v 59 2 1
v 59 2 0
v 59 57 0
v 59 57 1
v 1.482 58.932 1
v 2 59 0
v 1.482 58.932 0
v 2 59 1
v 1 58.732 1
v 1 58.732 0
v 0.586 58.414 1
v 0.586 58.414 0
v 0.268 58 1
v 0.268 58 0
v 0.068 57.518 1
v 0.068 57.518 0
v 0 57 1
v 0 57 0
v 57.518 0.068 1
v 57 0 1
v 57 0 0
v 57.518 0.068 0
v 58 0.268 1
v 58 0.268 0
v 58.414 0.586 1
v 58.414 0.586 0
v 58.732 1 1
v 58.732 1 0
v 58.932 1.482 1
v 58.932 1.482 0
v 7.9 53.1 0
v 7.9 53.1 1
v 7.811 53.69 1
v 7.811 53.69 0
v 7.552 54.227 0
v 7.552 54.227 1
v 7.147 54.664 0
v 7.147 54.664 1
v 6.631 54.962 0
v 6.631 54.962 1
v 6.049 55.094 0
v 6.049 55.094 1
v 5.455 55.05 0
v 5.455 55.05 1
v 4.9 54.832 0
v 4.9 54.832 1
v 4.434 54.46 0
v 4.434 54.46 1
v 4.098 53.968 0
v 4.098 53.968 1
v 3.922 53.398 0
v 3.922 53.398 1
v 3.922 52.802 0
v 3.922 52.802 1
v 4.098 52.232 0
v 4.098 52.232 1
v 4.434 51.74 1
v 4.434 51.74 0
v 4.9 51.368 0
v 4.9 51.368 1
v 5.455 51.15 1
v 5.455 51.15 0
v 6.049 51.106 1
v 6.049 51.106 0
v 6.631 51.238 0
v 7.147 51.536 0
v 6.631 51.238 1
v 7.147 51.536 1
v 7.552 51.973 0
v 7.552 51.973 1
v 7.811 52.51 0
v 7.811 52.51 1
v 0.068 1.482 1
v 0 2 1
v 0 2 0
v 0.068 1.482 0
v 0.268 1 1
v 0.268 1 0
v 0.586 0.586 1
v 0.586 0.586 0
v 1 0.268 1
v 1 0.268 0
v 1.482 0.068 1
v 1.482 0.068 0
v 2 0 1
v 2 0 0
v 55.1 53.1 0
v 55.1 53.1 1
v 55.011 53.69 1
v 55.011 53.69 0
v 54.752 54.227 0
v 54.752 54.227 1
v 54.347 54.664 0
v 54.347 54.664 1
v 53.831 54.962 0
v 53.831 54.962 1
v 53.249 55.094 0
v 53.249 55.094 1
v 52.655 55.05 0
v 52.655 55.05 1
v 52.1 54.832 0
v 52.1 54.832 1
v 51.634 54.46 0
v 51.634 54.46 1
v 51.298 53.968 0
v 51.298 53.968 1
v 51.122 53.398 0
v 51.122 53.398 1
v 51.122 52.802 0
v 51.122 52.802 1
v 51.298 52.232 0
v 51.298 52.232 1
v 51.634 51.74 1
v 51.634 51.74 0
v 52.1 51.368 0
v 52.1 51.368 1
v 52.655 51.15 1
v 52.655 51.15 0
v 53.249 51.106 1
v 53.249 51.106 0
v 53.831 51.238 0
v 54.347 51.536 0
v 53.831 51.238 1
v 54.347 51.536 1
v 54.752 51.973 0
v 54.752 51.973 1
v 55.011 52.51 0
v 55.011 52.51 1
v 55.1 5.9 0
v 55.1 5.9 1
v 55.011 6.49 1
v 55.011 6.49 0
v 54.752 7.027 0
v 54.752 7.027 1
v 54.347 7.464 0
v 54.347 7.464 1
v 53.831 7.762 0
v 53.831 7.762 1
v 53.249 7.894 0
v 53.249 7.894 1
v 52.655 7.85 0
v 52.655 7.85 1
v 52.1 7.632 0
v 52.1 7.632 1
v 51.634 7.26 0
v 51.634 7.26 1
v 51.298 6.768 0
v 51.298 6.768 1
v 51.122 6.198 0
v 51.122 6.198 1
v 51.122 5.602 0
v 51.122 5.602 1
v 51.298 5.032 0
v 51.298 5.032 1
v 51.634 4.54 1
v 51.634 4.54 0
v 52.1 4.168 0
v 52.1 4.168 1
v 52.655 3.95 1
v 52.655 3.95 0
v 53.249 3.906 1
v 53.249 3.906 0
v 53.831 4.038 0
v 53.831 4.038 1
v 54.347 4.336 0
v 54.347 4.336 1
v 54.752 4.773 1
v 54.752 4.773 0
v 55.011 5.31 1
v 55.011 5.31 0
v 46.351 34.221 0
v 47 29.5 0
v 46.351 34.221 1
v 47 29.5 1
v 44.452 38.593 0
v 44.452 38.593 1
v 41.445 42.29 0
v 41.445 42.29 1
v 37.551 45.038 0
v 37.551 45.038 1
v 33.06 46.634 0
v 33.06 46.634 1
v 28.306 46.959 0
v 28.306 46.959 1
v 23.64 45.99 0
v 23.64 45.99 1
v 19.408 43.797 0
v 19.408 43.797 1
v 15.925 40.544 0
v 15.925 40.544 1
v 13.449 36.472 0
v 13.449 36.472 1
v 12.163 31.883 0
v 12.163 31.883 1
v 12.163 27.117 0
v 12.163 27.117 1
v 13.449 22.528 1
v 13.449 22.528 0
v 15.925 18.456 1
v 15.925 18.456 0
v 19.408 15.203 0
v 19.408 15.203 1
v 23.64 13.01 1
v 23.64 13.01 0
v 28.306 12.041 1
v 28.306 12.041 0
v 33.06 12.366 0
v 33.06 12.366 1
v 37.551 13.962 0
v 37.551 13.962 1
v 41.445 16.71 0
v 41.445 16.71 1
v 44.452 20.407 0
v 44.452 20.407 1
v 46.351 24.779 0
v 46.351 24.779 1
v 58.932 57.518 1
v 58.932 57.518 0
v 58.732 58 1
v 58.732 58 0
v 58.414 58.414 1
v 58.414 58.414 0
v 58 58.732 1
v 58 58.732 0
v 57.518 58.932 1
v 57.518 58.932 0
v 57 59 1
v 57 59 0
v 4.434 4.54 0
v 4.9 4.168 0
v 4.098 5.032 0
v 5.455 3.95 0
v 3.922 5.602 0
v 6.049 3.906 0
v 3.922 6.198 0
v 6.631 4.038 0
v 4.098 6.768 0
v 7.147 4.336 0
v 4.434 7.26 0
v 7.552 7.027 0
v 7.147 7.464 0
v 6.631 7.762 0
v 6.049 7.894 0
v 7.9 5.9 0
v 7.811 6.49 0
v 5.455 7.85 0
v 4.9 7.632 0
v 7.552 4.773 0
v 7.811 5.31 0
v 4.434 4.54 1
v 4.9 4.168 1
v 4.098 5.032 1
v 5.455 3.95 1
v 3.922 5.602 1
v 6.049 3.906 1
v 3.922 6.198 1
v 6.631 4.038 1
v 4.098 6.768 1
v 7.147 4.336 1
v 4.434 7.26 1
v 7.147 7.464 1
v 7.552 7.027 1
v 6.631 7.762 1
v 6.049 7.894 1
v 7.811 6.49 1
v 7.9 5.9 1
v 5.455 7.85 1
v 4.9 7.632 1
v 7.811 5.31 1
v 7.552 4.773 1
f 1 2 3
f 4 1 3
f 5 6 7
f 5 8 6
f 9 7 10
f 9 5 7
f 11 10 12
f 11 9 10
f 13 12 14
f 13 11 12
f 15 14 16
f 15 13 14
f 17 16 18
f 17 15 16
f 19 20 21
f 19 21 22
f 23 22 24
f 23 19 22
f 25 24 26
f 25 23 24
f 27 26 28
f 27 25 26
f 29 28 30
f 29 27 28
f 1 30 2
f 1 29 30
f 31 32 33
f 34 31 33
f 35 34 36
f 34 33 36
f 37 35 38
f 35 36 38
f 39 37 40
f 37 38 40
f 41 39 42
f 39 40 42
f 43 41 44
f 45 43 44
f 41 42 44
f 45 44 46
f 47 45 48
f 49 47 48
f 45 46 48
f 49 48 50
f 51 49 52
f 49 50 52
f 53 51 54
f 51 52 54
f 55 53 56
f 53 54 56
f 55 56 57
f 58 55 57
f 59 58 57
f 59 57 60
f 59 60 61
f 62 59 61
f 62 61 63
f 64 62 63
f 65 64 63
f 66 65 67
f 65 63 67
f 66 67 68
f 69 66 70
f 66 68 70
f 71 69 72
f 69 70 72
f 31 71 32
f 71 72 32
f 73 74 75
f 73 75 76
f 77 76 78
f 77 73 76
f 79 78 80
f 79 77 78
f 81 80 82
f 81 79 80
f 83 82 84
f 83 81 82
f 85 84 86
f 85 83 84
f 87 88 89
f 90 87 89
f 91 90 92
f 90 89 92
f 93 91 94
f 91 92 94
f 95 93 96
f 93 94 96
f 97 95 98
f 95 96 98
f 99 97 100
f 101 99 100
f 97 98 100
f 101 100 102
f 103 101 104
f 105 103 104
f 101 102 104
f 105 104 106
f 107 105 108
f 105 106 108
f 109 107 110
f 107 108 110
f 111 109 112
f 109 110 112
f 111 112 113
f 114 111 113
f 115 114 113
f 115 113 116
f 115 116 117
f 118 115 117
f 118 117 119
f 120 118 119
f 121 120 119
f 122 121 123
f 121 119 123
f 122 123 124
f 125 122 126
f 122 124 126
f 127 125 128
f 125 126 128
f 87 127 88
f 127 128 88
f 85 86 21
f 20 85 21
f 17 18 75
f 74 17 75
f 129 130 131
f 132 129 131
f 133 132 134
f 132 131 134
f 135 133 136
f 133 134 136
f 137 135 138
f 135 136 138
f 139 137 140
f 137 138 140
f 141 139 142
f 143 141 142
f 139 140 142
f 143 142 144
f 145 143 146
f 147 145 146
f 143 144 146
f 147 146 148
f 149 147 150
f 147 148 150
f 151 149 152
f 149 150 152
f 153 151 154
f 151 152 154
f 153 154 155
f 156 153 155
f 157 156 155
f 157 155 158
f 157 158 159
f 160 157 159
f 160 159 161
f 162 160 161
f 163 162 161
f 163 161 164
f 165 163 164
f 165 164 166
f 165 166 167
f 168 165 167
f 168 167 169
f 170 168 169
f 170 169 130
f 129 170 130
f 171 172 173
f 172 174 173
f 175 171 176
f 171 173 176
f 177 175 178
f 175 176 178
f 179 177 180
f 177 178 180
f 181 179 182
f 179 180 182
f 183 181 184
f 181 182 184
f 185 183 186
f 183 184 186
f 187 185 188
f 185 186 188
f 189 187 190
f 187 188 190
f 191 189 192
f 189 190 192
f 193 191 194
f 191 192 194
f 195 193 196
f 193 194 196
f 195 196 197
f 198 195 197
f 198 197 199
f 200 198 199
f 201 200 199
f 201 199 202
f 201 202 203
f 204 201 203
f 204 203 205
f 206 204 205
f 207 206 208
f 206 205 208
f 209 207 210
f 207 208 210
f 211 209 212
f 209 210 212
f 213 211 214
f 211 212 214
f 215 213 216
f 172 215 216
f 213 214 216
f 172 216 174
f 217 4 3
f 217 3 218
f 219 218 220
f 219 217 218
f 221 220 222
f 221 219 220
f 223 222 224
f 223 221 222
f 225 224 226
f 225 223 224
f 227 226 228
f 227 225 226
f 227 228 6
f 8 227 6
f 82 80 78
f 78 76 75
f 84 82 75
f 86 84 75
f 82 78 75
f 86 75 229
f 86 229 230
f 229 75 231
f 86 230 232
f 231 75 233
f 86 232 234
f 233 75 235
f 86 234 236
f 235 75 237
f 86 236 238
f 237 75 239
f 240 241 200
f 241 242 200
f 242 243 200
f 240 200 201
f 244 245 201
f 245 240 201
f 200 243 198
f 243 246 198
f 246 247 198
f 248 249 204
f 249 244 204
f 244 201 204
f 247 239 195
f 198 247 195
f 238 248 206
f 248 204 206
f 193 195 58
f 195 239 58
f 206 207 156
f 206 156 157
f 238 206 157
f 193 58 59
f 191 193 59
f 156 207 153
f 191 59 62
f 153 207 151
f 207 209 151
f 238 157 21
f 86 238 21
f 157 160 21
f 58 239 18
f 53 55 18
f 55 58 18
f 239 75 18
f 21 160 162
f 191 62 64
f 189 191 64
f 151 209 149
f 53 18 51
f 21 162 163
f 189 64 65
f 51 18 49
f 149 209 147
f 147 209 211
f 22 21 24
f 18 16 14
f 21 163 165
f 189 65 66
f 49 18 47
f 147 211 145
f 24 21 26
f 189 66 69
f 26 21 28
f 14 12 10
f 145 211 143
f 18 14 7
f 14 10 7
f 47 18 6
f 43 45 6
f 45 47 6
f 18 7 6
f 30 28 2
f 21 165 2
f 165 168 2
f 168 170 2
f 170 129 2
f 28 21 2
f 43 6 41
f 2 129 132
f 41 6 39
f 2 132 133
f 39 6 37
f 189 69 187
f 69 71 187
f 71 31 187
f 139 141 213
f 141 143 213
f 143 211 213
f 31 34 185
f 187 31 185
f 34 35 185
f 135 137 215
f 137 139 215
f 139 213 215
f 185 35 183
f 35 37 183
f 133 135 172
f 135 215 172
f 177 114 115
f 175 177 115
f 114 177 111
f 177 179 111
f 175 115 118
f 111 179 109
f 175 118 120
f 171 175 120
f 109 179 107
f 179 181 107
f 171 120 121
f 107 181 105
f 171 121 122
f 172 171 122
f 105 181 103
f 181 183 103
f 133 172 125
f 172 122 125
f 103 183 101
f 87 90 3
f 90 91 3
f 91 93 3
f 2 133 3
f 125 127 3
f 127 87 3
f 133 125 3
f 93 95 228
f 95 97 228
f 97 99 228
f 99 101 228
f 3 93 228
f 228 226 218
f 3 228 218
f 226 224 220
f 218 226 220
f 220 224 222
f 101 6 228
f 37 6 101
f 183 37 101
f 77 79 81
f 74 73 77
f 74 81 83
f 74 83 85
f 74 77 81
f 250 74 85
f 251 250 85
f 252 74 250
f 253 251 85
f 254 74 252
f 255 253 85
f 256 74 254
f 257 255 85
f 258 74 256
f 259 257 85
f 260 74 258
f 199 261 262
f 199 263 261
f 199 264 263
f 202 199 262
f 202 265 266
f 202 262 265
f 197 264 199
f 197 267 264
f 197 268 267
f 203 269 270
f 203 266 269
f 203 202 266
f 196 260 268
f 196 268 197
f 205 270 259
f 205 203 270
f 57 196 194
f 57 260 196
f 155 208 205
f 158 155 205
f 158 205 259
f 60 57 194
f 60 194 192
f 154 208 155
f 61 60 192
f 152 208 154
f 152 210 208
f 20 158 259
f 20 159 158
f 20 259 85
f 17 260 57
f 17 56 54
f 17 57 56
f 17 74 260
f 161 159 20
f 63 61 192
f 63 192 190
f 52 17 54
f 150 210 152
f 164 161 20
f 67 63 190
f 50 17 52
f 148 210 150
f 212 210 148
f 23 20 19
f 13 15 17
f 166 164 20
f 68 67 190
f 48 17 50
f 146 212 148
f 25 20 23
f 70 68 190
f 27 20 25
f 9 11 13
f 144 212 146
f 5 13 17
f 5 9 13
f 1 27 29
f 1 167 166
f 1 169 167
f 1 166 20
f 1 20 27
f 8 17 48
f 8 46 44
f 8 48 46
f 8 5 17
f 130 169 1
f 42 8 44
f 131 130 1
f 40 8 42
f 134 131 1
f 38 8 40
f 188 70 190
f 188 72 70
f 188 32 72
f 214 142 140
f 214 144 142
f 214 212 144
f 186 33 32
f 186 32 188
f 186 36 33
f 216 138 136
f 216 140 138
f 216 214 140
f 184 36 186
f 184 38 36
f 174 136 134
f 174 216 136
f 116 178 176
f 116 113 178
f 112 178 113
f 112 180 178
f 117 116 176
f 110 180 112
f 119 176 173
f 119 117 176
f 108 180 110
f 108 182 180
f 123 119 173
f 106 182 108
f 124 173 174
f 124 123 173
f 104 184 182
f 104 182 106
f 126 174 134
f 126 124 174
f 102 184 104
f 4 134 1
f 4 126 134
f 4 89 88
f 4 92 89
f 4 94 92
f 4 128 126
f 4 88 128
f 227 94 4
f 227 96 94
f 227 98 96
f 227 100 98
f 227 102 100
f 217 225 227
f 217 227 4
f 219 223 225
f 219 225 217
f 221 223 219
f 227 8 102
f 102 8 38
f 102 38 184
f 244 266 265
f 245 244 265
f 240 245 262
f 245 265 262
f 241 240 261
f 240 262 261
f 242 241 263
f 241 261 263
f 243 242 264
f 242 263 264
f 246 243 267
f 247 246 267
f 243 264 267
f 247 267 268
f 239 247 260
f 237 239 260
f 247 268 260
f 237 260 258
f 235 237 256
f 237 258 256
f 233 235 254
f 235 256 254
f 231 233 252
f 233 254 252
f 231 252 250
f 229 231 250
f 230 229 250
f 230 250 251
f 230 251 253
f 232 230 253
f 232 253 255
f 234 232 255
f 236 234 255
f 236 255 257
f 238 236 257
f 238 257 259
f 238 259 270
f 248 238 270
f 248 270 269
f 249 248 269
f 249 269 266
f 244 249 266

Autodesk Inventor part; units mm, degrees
ref_plane "YZ Plane" through (0, 0, 0) normal (1, 0, 0) x (0, 1, 0)
ref_plane "XZ Plane" through (0, 0, 0) normal (0, 1, 0) x (-1, 0, 0)
ref_plane "XY Plane" through (0, 0, 0) normal (0, 0, 1) x (1, 0, 0)
sketch "Sketch1" plane through (0, 0, 0) normal (0, 0, 1) x (1, 0, 0)
  line L0 (0, 0) -> (59, 0)
  line L1 (59, 0) -> (59, 59)
  line L2 (59, 59) -> (0, 59)
  line L3 (0, 59) -> (0, 0)
  dimension "d0" = 59
  dimension "d1" = 59
extrude "Extrusion1" add sketch "Sketch1" along normal blind 1
sketch "Sketch2" plane through (0, 0, 1) normal (0, 0, 1) x (1, 0, 0)
  circle A0 centre (29.5, 29.5) radius 17.5
  line L0 (59, 59) -> (0, 59) projected
  line L1 (0, 59) -> (0, 0) projected
  point P0 (29.5, 59)
  point P1 (0, 29.5)
  dimension "d4" = 35
extrude "Extrusion2" cut sketch "Sketch2" against normal through all
sketch "Sketch3" plane through (0, 0, 1) normal (0, 0, 1) x (1, 0, 0)
  line L0 (5.9, 5.9) -> (53.1, 5.9) construction
  line L1 (53.1, 5.9) -> (53.1, 53.1) construction
  line L2 (53.1, 53.1) -> (5.9, 53.1) construction
  line L3 (5.9, 53.1) -> (5.9, 5.9) construction
  line L4 (59, 59) -> (0, 59) construction
  line L5 (0, 59) -> (0, 0) construction
  circle A0 centre (5.9, 53.1) radius 2
  circle A1 centre (53.1, 53.1) radius 2
  circle A2 centre (53.1, 5.9) radius 2
  circle A3 centre (5.9, 5.9) radius 2
  point P0 (29.5, 53.1)
  point P1 (29.5, 59)
  point P2 (53.1, 29.5)
  point P3 (0, 29.5)
  dimension "d7" = 47.2
  dimension "d8" = 47.2
  dimension "d9" = 4
  dimension "d10" = 4
  dimension "d11" = 4
  dimension "d12" = 4
extrude "Extrusion3" cut sketch "Sketch3" against normal through all
fillet "Fillet1" radius 2 4 edges at (0, 59, 0.5) (59, 59, 0.5) (59, 0, 0.5) (0, 0, 0.5)
properties material "Aluminum 6061"
